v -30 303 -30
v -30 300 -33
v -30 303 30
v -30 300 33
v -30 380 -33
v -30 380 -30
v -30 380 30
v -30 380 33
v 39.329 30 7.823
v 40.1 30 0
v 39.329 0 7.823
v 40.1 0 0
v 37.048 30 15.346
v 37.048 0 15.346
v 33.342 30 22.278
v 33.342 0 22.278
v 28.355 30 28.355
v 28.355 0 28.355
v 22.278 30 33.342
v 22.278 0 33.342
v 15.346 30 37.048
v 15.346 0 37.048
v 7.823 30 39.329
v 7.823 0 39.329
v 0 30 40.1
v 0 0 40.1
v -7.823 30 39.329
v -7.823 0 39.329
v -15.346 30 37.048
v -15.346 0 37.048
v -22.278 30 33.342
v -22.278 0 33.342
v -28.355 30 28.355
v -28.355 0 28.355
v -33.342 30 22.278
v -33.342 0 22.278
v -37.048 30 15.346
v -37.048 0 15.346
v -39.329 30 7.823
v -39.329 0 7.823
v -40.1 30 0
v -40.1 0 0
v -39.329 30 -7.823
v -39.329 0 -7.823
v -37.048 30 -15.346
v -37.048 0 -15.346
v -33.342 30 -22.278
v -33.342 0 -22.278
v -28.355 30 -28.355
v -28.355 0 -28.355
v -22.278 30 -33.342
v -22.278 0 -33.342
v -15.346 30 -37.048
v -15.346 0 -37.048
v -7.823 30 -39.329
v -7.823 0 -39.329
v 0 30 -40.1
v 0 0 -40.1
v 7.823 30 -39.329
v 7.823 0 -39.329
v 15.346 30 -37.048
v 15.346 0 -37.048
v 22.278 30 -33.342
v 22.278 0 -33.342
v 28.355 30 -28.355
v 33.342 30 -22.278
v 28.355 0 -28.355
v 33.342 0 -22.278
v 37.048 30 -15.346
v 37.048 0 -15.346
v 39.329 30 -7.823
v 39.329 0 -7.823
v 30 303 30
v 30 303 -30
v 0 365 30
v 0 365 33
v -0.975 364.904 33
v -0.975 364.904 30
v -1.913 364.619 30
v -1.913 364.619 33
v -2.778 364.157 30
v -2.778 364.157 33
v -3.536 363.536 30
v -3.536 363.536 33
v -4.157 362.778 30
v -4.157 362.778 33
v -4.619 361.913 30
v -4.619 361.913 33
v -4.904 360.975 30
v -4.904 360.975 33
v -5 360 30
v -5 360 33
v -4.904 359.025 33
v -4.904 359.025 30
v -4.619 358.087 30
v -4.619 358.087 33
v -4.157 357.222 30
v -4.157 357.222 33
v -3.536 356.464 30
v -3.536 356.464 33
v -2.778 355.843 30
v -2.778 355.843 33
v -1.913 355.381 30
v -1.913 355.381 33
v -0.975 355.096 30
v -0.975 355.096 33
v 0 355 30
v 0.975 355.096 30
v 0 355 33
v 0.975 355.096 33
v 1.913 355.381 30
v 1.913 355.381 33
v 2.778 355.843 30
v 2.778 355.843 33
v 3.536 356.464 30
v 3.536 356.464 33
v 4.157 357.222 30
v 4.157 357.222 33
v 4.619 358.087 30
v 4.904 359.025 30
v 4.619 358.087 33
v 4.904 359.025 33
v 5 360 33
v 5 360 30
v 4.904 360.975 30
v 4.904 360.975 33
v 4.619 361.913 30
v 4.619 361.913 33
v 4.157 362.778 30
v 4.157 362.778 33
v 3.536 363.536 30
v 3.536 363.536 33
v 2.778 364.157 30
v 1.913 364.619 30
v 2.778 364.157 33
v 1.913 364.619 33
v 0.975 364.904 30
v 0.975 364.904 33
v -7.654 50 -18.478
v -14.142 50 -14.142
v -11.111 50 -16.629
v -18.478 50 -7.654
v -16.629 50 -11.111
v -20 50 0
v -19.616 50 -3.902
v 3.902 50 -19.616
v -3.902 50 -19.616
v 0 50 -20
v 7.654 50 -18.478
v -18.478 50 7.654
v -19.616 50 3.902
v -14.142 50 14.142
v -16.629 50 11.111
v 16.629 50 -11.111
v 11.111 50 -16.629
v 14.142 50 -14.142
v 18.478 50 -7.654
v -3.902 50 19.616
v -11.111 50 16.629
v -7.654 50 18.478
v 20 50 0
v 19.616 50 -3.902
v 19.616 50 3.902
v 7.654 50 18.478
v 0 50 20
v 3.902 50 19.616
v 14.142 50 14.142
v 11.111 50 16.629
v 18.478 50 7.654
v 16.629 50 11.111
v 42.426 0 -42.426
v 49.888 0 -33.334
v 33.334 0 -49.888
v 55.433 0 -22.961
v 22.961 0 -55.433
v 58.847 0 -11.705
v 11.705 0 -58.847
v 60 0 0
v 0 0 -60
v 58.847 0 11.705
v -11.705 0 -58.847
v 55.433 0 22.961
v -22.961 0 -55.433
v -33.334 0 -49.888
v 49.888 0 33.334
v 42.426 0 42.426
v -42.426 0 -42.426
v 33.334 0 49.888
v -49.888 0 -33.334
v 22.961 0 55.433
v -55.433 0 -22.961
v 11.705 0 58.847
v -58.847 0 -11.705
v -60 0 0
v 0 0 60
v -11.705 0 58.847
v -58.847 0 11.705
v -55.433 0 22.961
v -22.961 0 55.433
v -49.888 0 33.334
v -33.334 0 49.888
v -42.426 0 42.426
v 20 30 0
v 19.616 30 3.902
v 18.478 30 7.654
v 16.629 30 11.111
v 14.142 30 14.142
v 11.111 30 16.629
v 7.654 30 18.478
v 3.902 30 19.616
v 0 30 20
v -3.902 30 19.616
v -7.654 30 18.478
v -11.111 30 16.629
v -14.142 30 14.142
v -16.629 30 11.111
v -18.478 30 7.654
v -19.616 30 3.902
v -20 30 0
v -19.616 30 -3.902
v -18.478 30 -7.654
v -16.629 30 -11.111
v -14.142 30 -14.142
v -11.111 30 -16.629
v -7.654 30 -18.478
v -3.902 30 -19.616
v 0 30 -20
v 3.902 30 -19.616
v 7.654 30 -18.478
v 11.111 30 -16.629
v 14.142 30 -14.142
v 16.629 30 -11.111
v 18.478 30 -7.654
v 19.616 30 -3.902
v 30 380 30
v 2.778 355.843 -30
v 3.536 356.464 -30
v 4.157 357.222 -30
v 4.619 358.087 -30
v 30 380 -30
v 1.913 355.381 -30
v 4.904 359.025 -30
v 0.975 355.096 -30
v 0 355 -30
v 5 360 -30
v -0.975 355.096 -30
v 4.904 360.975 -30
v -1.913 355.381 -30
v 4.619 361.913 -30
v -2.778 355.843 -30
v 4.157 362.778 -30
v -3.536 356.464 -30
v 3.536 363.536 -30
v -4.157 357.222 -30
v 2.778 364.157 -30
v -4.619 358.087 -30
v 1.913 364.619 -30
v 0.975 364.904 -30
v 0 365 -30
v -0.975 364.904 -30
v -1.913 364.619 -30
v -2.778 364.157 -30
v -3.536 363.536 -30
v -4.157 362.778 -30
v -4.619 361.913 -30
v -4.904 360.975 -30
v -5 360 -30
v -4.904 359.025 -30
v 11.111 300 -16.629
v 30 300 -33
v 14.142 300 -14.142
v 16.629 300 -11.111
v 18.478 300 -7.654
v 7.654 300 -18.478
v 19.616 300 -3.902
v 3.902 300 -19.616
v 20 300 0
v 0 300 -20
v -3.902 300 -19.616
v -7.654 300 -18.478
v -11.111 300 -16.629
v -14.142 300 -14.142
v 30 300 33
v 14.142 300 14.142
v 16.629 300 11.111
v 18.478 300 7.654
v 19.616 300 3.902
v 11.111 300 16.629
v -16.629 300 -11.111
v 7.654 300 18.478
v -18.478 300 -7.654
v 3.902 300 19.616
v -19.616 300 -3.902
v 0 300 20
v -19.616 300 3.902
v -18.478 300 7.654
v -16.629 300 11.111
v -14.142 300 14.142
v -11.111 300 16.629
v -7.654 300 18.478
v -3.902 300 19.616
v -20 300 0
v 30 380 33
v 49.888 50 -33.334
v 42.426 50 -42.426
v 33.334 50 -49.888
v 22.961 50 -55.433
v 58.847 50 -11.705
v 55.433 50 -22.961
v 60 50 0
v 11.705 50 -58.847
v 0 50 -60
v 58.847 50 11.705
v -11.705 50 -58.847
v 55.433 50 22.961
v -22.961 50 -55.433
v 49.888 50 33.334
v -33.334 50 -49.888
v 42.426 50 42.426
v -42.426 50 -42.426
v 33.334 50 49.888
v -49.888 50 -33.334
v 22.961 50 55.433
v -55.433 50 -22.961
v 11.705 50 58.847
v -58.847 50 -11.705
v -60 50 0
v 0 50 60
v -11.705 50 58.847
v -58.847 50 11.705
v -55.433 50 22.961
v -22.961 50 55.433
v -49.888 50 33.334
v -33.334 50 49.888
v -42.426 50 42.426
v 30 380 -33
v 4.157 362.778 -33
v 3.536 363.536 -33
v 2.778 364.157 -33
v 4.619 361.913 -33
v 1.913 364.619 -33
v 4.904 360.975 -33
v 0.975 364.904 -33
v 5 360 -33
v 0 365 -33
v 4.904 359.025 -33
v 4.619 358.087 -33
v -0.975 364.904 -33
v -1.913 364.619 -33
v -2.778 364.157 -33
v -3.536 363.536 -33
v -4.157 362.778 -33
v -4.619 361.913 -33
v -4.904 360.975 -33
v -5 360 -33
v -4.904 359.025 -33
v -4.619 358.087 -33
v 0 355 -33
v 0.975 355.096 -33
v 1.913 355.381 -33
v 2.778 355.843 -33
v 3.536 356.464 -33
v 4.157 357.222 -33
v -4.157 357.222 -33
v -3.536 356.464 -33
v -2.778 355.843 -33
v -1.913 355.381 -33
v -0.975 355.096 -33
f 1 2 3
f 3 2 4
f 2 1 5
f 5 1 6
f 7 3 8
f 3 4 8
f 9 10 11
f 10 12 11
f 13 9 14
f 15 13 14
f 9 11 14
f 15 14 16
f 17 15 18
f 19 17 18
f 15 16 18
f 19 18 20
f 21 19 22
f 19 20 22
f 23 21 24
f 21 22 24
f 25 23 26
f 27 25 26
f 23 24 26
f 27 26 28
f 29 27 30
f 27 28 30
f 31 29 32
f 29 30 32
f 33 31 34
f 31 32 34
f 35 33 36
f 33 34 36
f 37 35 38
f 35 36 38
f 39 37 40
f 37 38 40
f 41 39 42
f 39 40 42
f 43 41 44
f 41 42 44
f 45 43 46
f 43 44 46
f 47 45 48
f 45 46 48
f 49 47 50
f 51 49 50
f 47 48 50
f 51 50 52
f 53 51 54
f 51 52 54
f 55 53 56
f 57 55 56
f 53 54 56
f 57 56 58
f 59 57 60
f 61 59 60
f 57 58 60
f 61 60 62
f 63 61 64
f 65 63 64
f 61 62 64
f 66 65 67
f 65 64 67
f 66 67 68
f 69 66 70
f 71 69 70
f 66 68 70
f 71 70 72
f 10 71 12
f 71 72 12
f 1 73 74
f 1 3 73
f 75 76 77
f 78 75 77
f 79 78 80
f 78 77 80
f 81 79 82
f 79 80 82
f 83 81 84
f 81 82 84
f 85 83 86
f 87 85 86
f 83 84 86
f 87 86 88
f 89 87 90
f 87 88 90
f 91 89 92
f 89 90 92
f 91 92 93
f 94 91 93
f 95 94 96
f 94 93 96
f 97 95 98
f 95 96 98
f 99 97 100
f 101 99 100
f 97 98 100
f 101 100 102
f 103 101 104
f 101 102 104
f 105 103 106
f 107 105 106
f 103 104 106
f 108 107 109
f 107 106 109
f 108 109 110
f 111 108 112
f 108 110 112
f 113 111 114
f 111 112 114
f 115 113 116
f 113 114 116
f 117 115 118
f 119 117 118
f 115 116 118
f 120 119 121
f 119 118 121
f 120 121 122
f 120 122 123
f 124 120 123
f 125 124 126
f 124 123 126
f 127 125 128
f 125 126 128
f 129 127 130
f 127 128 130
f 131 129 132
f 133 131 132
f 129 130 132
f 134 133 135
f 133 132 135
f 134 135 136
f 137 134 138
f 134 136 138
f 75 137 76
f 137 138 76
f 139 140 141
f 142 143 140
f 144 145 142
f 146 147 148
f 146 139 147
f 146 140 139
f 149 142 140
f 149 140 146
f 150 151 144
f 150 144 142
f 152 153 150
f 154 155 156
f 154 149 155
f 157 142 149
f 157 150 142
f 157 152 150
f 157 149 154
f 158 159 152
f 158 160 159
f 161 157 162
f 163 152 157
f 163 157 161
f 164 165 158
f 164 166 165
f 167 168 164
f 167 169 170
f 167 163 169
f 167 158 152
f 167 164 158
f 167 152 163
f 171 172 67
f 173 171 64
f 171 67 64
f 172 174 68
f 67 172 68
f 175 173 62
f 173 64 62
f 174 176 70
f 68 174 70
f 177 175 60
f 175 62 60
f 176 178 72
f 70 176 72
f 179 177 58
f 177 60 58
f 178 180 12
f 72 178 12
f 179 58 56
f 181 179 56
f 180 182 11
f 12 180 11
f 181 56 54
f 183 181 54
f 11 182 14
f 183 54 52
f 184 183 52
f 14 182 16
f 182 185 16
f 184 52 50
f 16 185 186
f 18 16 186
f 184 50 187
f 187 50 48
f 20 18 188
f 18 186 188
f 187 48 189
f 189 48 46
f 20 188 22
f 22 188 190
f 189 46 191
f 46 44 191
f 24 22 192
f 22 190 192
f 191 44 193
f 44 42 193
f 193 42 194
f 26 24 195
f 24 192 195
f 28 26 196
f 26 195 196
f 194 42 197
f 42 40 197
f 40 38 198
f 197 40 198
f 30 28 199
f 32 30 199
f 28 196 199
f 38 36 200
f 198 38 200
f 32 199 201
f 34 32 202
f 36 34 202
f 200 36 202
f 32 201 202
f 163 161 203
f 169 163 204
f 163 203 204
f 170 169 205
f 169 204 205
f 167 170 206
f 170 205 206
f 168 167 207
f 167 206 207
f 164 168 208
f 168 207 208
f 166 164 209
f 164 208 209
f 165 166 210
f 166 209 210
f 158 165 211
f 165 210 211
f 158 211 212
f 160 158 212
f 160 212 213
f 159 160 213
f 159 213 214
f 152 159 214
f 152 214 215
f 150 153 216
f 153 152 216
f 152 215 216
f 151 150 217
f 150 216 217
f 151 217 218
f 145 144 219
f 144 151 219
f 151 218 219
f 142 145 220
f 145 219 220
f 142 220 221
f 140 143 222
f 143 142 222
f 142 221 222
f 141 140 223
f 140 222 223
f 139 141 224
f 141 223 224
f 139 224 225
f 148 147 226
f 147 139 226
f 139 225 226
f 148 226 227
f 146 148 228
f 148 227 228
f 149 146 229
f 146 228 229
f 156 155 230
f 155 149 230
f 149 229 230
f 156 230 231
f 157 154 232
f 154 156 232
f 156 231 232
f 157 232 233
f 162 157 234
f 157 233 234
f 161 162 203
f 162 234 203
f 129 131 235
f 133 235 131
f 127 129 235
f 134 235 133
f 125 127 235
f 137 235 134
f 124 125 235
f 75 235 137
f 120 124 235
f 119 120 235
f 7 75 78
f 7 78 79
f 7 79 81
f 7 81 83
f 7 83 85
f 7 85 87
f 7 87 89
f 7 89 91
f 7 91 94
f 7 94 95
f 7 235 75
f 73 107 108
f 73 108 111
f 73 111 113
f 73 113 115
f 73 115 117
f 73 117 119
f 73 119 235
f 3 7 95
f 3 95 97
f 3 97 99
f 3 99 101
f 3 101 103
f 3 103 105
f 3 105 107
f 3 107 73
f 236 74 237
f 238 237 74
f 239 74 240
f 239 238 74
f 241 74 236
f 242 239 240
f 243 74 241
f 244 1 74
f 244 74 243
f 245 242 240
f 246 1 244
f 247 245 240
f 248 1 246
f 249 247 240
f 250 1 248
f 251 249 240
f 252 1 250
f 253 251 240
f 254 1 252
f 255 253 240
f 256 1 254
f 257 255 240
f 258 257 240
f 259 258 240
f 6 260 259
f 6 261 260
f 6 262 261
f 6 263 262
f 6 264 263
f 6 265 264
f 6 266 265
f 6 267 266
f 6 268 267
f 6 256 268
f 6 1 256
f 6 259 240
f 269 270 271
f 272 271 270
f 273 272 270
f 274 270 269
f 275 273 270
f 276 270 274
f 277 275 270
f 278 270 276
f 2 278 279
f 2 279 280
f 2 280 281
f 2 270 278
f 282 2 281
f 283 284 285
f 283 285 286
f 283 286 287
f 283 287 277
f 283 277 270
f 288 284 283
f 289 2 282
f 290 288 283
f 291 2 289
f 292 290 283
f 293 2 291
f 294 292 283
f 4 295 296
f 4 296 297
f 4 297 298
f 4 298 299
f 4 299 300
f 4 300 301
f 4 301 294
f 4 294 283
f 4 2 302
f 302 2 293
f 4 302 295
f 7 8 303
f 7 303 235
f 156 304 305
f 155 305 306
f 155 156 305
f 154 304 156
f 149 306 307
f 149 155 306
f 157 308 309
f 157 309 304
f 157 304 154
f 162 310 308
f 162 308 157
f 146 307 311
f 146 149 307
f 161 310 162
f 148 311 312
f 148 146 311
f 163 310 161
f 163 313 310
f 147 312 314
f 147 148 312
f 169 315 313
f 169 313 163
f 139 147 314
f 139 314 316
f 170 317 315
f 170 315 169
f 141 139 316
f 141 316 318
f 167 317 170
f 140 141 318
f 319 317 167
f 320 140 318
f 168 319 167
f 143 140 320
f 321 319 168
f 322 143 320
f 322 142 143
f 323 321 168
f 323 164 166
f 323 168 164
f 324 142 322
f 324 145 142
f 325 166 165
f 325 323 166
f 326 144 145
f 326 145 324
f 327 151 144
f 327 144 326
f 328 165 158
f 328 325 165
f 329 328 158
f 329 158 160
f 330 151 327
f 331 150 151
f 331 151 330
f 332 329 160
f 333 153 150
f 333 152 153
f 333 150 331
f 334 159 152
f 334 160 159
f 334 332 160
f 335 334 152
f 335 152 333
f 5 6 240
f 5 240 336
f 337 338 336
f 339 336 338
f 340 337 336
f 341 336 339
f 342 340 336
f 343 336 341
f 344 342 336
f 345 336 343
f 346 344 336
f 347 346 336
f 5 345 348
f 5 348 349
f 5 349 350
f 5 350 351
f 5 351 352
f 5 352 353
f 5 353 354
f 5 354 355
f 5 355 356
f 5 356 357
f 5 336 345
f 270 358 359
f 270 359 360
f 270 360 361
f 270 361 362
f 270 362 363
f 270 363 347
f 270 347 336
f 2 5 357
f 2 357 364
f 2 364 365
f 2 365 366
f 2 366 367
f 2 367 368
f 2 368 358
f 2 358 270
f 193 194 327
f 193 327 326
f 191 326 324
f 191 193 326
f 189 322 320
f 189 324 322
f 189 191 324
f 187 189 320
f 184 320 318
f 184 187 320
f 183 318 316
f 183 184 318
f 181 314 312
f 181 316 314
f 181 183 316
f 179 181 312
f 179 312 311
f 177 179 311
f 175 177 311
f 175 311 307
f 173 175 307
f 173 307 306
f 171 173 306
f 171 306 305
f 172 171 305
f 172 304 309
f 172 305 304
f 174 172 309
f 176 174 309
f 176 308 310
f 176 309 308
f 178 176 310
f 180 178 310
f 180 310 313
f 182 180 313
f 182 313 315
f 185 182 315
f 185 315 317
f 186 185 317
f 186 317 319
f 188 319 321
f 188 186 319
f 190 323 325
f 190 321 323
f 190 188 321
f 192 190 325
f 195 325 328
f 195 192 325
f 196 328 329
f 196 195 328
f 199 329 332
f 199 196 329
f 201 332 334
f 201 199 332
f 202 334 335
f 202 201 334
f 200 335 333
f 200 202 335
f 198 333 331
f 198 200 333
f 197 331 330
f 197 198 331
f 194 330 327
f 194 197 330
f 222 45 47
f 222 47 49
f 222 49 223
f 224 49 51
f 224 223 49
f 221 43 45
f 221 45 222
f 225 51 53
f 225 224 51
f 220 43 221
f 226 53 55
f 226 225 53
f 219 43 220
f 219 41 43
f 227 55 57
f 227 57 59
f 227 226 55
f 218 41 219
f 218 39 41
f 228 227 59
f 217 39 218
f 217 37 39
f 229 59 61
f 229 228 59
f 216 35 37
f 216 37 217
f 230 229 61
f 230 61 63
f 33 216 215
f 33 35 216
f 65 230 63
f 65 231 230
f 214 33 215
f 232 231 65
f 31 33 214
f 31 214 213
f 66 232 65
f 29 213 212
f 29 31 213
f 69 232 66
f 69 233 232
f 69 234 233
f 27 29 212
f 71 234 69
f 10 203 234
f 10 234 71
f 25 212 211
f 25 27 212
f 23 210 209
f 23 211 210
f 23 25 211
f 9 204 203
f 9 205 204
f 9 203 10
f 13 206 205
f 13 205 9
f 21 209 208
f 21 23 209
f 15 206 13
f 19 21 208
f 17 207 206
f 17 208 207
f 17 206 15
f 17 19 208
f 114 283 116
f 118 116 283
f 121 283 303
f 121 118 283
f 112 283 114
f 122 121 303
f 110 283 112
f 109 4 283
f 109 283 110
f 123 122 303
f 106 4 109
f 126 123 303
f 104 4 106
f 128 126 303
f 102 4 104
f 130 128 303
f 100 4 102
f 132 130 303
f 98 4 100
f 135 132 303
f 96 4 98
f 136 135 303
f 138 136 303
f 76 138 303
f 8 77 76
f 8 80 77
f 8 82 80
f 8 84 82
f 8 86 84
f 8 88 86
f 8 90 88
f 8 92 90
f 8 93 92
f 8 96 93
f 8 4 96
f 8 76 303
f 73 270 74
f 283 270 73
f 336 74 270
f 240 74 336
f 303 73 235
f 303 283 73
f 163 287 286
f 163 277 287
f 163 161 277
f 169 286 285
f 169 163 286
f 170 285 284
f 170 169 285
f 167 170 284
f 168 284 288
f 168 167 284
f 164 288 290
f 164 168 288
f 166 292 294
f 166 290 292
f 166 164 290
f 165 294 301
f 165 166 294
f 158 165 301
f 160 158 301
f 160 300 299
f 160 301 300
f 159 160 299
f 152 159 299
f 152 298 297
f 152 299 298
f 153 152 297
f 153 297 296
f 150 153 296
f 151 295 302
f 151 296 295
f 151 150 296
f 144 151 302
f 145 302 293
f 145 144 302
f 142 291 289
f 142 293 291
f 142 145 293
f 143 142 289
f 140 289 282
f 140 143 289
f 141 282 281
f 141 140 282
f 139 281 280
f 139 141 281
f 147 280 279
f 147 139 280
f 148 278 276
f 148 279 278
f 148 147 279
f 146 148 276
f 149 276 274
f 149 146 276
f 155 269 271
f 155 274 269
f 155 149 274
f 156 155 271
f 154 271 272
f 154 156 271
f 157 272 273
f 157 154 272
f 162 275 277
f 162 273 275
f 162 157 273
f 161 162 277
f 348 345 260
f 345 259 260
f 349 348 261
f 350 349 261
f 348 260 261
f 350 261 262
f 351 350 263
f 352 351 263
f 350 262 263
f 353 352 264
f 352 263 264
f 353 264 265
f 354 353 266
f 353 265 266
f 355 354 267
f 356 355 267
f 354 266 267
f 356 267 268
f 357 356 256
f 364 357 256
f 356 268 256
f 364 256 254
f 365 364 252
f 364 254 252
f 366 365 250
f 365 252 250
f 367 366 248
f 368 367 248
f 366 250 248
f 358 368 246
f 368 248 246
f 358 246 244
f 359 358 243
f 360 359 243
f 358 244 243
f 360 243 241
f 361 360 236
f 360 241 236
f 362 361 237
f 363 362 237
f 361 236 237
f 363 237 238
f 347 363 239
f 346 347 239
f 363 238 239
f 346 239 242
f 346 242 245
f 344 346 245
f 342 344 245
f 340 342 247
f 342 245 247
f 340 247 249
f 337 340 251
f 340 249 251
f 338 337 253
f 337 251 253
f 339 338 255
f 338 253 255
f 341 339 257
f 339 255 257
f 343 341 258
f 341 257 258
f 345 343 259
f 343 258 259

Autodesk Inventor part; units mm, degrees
ref_plane "YZ Plane" through (0, 0, 0) normal (1, 0, 0) x (0, 1, 0)
ref_plane "XZ Plane" through (0, 0, 0) normal (0, 1, 0) x (-1, 0, 0)
ref_plane "XY Plane" through (0, 0, 0) normal (0, 0, 1) x (1, 0, 0)
sketch "Sketch1" plane through (0, 0, 0) normal (0, 1, 0) x (-1, 0, 0)
  circle A0 centre (0, 0) radius 60
  dimension "d0" = 120
extrude "Extrusion1" add sketch "Sketch1" along normal blind 50
sketch "Sketch2" plane through (0, 50, 0) normal (0, 1, 0) x (1, 0, 0)
  circle A0 centre (0, 0) radius 20
  dimension "d3" = 40
extrude "Extrusion2" add sketch "Sketch2" along normal blind 250
sketch "Sketch4" plane through (0, 0, 0) normal (0, -1, 0) x (1, 0, 0)
  circle A0 centre (0, 0) radius 60 projected
  circle A1 centre (0, 0) radius 40.1
  dimension "d11" = 80.2
extrude "Extrusion4" cut sketch "Sketch4" against normal blind 30 contours A1
sketch "Sketch5" plane through (0, 0, 0) normal (0, -1, 0) x (1, 0, 0)
  circle A0 centre (0, 0) radius 20
  dimension "d14" = 40
extrude "Extrusion5" cut sketch "Sketch5" against normal blind 50
sketch "Sketch11" plane through (0, 0, 0) normal (1, 0, 0) x (0, 1, 0)
  line L0 (300, -20) -> (300, 20) projected
  line L1 (300, 33) -> (380, 33)
  line L2 (380, -33) -> (300, -33)
  line L3 (300, -33) -> (300, 33)
  line L4 (300, 0) -> (400, 0)
  line L5 (380, 30) -> (303, 30)
  line L6 (303, 30) -> (303, -30)
  line L7 (303, -30) -> (380, -30)
  line L8 (380, 33) -> (380, 30)
  line L9 (380, -30) -> (380, -33)
  point P0 (0, 0)
  dimension "d50" = 3
  dimension "d51" = 80
  dimension "d52" = 3
  dimension "d64" = 60
extrude "Extrusion8" add sketch "Sketch11" along normal mid plane 60
sketch "Sketch12" plane through (30, 380, -33) normal (0, 0, -1) x (-1, 0, 0)
  line L0 (60, -80) -> (0, -80) projected
  line L1 (0, -80) -> (0, 0) projected
  point P0 (30, -380)
  point P1 (30, -20)
  dimension "d55" = 60
  dimension "d56" = 30
hole "Hole3" at (0, 360, -33) direction (0, 0, 1) diameter 10 end through all
properties part number "Base Arm 2"
